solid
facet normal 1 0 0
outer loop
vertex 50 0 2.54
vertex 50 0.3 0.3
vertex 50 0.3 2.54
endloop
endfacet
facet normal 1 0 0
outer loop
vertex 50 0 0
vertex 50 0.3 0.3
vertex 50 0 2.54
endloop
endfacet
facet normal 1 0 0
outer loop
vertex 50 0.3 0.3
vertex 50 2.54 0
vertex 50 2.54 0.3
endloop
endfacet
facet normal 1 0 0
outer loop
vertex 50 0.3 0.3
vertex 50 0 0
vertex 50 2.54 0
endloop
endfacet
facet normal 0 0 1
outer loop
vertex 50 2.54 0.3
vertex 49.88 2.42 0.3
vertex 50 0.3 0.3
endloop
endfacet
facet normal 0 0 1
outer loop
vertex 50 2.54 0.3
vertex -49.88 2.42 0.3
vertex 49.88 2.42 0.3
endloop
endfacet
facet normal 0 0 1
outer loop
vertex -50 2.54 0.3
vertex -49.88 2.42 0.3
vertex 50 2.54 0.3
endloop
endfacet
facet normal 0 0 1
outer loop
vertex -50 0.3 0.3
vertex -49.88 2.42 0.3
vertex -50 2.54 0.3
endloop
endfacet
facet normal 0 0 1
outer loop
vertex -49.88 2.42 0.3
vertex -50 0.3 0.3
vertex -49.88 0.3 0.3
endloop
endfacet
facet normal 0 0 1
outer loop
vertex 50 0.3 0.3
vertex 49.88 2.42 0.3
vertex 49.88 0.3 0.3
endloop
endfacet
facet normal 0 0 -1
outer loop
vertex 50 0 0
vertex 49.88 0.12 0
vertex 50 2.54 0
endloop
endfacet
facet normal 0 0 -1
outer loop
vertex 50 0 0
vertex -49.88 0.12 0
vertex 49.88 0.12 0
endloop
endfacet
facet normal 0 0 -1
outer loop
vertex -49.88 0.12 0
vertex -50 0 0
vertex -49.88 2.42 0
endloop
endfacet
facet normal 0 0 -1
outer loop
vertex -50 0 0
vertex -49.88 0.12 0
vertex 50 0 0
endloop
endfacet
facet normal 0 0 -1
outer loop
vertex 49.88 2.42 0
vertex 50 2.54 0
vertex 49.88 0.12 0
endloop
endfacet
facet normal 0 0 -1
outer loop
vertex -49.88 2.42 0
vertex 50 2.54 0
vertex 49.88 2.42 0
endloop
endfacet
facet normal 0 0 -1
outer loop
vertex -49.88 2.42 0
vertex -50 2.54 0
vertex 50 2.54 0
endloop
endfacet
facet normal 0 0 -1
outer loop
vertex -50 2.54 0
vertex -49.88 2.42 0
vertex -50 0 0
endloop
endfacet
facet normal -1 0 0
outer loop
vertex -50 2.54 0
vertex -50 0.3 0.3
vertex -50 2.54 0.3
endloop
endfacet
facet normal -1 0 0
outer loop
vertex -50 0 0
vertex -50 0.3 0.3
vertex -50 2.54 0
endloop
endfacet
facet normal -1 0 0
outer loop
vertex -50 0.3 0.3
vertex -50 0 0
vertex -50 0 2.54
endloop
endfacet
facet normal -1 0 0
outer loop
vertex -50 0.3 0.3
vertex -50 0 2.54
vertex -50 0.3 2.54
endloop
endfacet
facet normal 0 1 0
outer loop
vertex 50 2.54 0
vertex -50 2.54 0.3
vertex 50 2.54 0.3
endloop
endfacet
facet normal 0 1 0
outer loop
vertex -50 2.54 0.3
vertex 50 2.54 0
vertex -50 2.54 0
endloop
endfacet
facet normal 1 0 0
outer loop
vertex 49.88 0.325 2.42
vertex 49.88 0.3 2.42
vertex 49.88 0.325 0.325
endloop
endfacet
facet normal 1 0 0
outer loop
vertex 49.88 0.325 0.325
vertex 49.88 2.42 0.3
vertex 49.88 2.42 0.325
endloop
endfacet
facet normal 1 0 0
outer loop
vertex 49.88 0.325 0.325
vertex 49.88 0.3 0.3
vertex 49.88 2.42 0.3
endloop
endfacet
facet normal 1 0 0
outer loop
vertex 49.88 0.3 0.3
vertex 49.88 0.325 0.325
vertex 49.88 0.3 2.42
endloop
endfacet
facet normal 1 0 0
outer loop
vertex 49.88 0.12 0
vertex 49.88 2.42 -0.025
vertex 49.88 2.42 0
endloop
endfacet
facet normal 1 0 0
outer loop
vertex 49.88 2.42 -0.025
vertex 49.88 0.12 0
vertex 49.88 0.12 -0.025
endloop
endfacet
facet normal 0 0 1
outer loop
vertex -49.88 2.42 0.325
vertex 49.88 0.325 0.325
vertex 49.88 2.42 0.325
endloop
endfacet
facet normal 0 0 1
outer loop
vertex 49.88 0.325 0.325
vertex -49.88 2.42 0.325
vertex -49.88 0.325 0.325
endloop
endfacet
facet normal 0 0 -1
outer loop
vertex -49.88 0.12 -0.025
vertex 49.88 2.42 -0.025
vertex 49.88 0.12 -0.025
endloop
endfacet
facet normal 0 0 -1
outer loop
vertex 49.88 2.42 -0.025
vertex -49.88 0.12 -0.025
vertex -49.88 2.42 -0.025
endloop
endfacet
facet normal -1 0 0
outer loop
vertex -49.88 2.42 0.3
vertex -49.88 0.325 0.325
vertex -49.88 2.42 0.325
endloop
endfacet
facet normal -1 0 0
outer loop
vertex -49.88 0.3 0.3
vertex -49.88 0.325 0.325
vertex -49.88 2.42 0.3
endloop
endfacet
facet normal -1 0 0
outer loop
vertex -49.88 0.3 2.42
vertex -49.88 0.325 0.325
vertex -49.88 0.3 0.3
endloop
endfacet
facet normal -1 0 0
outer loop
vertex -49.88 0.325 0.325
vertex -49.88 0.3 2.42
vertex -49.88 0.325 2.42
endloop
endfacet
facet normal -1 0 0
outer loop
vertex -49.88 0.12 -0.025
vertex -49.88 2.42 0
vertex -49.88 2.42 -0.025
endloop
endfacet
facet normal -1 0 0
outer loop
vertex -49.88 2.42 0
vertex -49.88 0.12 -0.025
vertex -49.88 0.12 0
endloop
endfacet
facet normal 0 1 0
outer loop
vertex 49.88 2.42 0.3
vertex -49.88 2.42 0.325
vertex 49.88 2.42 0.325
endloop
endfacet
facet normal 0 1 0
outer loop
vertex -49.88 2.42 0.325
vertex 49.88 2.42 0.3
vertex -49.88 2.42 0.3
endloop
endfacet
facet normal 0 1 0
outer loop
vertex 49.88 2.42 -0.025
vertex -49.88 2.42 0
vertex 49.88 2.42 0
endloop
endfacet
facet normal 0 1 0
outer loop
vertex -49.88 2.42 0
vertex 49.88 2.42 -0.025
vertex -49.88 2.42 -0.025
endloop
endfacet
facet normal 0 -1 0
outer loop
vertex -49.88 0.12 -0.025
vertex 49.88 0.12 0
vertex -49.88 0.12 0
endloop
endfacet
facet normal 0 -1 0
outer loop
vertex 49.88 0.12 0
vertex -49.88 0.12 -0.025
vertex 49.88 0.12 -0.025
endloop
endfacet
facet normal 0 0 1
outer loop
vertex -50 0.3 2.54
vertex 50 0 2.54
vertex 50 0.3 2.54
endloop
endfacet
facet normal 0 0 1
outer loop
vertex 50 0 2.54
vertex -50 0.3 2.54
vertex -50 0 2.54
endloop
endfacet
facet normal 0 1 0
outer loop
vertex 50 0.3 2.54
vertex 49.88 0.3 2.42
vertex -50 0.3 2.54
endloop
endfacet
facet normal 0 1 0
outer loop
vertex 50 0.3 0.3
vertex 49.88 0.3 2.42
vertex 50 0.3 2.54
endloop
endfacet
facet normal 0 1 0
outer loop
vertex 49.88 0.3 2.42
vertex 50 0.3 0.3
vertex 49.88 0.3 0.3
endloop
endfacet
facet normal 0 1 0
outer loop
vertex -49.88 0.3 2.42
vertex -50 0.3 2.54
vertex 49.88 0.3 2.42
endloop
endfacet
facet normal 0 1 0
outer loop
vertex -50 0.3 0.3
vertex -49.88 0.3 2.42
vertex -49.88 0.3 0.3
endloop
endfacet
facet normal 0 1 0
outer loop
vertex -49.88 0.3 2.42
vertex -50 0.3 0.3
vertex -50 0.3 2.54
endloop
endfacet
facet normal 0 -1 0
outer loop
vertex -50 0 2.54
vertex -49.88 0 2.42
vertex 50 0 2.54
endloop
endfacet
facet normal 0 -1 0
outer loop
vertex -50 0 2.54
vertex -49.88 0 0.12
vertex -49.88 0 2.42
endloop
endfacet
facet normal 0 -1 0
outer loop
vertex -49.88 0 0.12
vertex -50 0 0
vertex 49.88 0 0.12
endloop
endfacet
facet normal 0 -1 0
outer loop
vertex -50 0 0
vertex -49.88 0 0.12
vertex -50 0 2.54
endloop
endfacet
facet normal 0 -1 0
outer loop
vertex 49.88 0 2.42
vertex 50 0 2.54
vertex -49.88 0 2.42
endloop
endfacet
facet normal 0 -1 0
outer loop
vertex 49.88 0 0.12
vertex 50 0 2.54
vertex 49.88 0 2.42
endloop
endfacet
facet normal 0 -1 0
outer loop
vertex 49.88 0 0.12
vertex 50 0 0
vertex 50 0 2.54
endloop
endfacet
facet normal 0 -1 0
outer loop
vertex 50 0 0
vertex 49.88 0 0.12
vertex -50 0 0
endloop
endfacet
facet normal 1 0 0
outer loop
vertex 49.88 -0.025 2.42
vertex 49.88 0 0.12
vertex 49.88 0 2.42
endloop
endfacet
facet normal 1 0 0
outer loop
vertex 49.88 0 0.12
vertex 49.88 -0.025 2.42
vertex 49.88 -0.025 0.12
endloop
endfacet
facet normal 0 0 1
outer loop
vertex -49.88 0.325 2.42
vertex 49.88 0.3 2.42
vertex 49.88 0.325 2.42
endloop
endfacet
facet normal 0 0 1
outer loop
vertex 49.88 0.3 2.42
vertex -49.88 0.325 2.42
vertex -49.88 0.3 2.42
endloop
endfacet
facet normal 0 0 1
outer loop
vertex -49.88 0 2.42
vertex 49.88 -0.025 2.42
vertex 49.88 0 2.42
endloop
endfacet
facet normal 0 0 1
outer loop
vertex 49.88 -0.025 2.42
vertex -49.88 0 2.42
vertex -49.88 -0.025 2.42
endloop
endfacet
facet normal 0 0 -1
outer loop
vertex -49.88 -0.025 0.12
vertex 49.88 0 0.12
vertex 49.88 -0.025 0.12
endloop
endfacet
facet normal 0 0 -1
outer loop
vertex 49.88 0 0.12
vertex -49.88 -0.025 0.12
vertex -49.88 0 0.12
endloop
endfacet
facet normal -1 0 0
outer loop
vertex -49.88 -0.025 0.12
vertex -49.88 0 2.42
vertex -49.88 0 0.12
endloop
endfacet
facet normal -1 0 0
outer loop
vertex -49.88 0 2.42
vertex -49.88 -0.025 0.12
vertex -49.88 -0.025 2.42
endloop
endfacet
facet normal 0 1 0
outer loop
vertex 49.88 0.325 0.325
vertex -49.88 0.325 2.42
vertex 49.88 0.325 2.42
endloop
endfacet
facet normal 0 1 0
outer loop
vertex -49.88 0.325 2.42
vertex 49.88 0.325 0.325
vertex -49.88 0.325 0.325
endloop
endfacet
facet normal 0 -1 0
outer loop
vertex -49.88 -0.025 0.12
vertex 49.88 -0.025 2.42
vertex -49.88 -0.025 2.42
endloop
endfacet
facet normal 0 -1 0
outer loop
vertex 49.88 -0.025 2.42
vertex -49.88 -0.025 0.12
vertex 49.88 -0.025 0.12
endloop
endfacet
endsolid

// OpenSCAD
module anglebar(length=100, c = "DimGray", width=1.5*2.54, thickn=0.4) 
{
  line_w = 0.12;
  small = 0.05;
  
  translate([0,width/2,thickn/2]) 
  {
    color(c) 
    cube([length, width, thickn], center = true);
  
    color("MintCream") 
    cube([length-2*line_w, width-2*line_w, thickn+small], center = true);
  }
  
  translate([0,thickn/2,width/2]) 
  {
    color(c) 
    cube([length, thickn, width], center = true);

    color("MintCream") 
    cube([length-2*line_w, thickn+small, width-2*line_w], center = true);
  }
}

module anglebar1(length=100, c = "DimGray", thickn=0.3)
{
    anglebar(length, c, 2.54, thickn);
}

module anglebar15(length=100, c = "DimGray", thickn=0.4)
{
    anglebar(length, c, 1.5*2.54, thickn);
}

module anglebar2(length=100, c = "DimGray", thickn=0.5)
{
    anglebar(length, c, 2*2.54, thickn);
}

// Name is C-Channel, even I used C-bar.
// Channel Bar: 75mm x 50mm x 3mm, 6 m piece 1500-1700 pesos.
// Channel Bar: 75mm x 50mm x 5mm, 6 m piece 2260 pesos.
// Bigger sizes available.
module c_bar(length=100, c = "DarkGray", width=2.0*2.54, height = 3*2.54,thickn=0.5) 
{
    color(c) {
        translate([0,width/2,-height/2+thickn/2]) 
            cube([length, width, thickn], center = true);
        translate([0,thickn/2,0]) 
            cube([length, thickn, height], center = true);
        translate([0, width/2,height/2 - thickn/2]) 
            cube([length, width, thickn], center = true);
    }
}

module c_bar3(length=100, c = "DarkGray", thickn=0.5) 
{
    c_bar(length, c, 5, 7.5, thickn);
} 

// Purlin with cuts for 45 degrees and roof angle
module c_purlin_angled(
    length=100, 
    left_45 = 0, left_roof_angle = 0, 
    right_45 = 0, right_roof_angle = 0, 
    c = "Red", 
    width=2.0*2.54, height = 6*2.54,
    thickn=0.15) 
{
    add_len_left = height * tan(left_roof_angle);
    add_len_right = height * tan(right_roof_angle);
    add_len_tmp = add_len_left > add_len_right
        ? add_len_left : add_len_right;
    add_len_tmp2 = add_len_tmp < 0 ? 0 : add_len_tmp; 
    add_len = ((left_45 < 0 || right_45 < 0) 
        && add_len_tmp2 < width) 
        ? width : add_len_tmp2;
    
    box_d = height * sqrt(2);
    box_w = 4*width  + 0.2;
       
    difference()
    {
        translate([0,0,-height/2])
        c_purlin(length + 2*add_len, c, width, height, thickn);

        translate([length/2, 0, 0])
        rotate([0, -right_roof_angle, 0])
        rotate([0, 0, right_45])
        translate([box_d/2, width/2, -height/2])
        cube([box_d, box_w, box_d], center=true);

        translate([-length/2, 0, 0])
        rotate([0, left_roof_angle, 0])
        rotate([0, 0, -left_45])
        translate([-box_d/2, width/2, -height/2])
        cube([box_d, box_w, box_d], center=true);
    }
}

// C purlins come as 2"x3", 2"x4", 2"x6" and 2"x7", 
// 6m long pieces. Metric sizes also available.
// Steel thicknessess 1.2mm, 1.5mm or 2.0mm.
// 1.5mm price is good (2"x3" lists 574 pesos), 
// 1.2mm is not much cheaper and 2.0mm is expensive.
module c_purlin(length=100, c = "DarkGray", width=2*2.54, height = 3*2.54,thickn=0.15) 
{
    elbow = height/10;
    color(c) {
        translate([0,width/2,-height/2+thickn/2]) 
            cube([length, width, thickn], center = true);
        translate([0,thickn/2,0]) 
            cube([length, thickn, height], center = true);
        translate([0, width/2,height/2 - thickn/2]) 
            cube([length, width, thickn], center = true);

        translate([0,width-thickn/2,-height/2+elbow/2]) 
            cube([length, thickn, elbow], center = true);

        translate([0,width-thickn/2,height/2-elbow/2]) 
            cube([length, thickn, elbow], center = true);
    }
}

module c_purlin3(length=100, c = "DarkGray", thickn=0.15) 
{
    c_purlin(length, c, 2*2.54, 3*2.54,thickn); 
}

module c_purlin6(length=100, c = [17/255, 112/255, 83/255,1], thickn=0.15) 
{
    c_purlin(length, c, 2*2.54, 6*2.54,thickn); 
}

// Purlin with cuts for 45 degrees and roof angle
module c_purlin6_angled(
    length=100, 
    left_45 = false, left_roof_angle = 0, 
    right_45 = false, right_roof_angle = 0, 
    c = [19/255, 52/255, 27/255,0.8]) 
{
    c_purlin_angled(length, 
        left_45, left_roof_angle, 
        right_45, right_roof_angle, 
        c, 
        2.0*2.54, 6*2.54, 0.15); 
}

module roof_turn(length=100, bend_r = 2, alpha=25, thickn=0.06) 
{
    move_y = bend_r * sin(alpha);
   
    rotate([90,0,0])
    difference() {
        translate([0,-move_y,0]) 
        cylinder(h = length, r = bend_r, $fn=16);
        
        translate([0,-move_y,-0.5]) 
        cylinder(h = length+1, r = bend_r-thickn, $fn=16);
        
        cube_sz = 2*bend_r + 0.2;
        translate([0,-cube_sz/2-0.05,length/2]) 
        cube([cube_sz, cube_sz, length + 0.5], center = true);
    }
}

module roof_slice(length=100, r = 2,alpha=20, thickn=0.06) 
{
    bend_r = r/cos(alpha);
    move_y = bend_r * (1-sin(alpha));
    
    translate([-r, 0, move_y]) 
       roof_turn(length, bend_r, alpha, thickn); 

    translate([r, 0, move_y]) 
    rotate([0,180,0])
       roof_turn(length, bend_r, alpha, thickn); 
}

module roof_piece(length=300, width=105, c = "DarkGreen") 
{
    r = 3*2.54/4;
    alpha = 45;
    n = ceil(width/(4*r));
    color(c)
    intersection() {
        union() {
            for (i = [0:n-1]) {
                x = i * 4 * r;
                translate([x-width/2,length,0])
                roof_slice(length, r, alpha);
            }
        }
        
        cube_h = 2*r;
        translate([0,length/2,cube_h/2]) 
        cube([width, length, cube_h], center = true);
    }
}

anglebar1();

/* c_purlin6_angled(
    length=200, 
    left_45 = 45, left_roof_angle = 0, 
    right_45 = -45, right_roof_angle = 0); 
*/
